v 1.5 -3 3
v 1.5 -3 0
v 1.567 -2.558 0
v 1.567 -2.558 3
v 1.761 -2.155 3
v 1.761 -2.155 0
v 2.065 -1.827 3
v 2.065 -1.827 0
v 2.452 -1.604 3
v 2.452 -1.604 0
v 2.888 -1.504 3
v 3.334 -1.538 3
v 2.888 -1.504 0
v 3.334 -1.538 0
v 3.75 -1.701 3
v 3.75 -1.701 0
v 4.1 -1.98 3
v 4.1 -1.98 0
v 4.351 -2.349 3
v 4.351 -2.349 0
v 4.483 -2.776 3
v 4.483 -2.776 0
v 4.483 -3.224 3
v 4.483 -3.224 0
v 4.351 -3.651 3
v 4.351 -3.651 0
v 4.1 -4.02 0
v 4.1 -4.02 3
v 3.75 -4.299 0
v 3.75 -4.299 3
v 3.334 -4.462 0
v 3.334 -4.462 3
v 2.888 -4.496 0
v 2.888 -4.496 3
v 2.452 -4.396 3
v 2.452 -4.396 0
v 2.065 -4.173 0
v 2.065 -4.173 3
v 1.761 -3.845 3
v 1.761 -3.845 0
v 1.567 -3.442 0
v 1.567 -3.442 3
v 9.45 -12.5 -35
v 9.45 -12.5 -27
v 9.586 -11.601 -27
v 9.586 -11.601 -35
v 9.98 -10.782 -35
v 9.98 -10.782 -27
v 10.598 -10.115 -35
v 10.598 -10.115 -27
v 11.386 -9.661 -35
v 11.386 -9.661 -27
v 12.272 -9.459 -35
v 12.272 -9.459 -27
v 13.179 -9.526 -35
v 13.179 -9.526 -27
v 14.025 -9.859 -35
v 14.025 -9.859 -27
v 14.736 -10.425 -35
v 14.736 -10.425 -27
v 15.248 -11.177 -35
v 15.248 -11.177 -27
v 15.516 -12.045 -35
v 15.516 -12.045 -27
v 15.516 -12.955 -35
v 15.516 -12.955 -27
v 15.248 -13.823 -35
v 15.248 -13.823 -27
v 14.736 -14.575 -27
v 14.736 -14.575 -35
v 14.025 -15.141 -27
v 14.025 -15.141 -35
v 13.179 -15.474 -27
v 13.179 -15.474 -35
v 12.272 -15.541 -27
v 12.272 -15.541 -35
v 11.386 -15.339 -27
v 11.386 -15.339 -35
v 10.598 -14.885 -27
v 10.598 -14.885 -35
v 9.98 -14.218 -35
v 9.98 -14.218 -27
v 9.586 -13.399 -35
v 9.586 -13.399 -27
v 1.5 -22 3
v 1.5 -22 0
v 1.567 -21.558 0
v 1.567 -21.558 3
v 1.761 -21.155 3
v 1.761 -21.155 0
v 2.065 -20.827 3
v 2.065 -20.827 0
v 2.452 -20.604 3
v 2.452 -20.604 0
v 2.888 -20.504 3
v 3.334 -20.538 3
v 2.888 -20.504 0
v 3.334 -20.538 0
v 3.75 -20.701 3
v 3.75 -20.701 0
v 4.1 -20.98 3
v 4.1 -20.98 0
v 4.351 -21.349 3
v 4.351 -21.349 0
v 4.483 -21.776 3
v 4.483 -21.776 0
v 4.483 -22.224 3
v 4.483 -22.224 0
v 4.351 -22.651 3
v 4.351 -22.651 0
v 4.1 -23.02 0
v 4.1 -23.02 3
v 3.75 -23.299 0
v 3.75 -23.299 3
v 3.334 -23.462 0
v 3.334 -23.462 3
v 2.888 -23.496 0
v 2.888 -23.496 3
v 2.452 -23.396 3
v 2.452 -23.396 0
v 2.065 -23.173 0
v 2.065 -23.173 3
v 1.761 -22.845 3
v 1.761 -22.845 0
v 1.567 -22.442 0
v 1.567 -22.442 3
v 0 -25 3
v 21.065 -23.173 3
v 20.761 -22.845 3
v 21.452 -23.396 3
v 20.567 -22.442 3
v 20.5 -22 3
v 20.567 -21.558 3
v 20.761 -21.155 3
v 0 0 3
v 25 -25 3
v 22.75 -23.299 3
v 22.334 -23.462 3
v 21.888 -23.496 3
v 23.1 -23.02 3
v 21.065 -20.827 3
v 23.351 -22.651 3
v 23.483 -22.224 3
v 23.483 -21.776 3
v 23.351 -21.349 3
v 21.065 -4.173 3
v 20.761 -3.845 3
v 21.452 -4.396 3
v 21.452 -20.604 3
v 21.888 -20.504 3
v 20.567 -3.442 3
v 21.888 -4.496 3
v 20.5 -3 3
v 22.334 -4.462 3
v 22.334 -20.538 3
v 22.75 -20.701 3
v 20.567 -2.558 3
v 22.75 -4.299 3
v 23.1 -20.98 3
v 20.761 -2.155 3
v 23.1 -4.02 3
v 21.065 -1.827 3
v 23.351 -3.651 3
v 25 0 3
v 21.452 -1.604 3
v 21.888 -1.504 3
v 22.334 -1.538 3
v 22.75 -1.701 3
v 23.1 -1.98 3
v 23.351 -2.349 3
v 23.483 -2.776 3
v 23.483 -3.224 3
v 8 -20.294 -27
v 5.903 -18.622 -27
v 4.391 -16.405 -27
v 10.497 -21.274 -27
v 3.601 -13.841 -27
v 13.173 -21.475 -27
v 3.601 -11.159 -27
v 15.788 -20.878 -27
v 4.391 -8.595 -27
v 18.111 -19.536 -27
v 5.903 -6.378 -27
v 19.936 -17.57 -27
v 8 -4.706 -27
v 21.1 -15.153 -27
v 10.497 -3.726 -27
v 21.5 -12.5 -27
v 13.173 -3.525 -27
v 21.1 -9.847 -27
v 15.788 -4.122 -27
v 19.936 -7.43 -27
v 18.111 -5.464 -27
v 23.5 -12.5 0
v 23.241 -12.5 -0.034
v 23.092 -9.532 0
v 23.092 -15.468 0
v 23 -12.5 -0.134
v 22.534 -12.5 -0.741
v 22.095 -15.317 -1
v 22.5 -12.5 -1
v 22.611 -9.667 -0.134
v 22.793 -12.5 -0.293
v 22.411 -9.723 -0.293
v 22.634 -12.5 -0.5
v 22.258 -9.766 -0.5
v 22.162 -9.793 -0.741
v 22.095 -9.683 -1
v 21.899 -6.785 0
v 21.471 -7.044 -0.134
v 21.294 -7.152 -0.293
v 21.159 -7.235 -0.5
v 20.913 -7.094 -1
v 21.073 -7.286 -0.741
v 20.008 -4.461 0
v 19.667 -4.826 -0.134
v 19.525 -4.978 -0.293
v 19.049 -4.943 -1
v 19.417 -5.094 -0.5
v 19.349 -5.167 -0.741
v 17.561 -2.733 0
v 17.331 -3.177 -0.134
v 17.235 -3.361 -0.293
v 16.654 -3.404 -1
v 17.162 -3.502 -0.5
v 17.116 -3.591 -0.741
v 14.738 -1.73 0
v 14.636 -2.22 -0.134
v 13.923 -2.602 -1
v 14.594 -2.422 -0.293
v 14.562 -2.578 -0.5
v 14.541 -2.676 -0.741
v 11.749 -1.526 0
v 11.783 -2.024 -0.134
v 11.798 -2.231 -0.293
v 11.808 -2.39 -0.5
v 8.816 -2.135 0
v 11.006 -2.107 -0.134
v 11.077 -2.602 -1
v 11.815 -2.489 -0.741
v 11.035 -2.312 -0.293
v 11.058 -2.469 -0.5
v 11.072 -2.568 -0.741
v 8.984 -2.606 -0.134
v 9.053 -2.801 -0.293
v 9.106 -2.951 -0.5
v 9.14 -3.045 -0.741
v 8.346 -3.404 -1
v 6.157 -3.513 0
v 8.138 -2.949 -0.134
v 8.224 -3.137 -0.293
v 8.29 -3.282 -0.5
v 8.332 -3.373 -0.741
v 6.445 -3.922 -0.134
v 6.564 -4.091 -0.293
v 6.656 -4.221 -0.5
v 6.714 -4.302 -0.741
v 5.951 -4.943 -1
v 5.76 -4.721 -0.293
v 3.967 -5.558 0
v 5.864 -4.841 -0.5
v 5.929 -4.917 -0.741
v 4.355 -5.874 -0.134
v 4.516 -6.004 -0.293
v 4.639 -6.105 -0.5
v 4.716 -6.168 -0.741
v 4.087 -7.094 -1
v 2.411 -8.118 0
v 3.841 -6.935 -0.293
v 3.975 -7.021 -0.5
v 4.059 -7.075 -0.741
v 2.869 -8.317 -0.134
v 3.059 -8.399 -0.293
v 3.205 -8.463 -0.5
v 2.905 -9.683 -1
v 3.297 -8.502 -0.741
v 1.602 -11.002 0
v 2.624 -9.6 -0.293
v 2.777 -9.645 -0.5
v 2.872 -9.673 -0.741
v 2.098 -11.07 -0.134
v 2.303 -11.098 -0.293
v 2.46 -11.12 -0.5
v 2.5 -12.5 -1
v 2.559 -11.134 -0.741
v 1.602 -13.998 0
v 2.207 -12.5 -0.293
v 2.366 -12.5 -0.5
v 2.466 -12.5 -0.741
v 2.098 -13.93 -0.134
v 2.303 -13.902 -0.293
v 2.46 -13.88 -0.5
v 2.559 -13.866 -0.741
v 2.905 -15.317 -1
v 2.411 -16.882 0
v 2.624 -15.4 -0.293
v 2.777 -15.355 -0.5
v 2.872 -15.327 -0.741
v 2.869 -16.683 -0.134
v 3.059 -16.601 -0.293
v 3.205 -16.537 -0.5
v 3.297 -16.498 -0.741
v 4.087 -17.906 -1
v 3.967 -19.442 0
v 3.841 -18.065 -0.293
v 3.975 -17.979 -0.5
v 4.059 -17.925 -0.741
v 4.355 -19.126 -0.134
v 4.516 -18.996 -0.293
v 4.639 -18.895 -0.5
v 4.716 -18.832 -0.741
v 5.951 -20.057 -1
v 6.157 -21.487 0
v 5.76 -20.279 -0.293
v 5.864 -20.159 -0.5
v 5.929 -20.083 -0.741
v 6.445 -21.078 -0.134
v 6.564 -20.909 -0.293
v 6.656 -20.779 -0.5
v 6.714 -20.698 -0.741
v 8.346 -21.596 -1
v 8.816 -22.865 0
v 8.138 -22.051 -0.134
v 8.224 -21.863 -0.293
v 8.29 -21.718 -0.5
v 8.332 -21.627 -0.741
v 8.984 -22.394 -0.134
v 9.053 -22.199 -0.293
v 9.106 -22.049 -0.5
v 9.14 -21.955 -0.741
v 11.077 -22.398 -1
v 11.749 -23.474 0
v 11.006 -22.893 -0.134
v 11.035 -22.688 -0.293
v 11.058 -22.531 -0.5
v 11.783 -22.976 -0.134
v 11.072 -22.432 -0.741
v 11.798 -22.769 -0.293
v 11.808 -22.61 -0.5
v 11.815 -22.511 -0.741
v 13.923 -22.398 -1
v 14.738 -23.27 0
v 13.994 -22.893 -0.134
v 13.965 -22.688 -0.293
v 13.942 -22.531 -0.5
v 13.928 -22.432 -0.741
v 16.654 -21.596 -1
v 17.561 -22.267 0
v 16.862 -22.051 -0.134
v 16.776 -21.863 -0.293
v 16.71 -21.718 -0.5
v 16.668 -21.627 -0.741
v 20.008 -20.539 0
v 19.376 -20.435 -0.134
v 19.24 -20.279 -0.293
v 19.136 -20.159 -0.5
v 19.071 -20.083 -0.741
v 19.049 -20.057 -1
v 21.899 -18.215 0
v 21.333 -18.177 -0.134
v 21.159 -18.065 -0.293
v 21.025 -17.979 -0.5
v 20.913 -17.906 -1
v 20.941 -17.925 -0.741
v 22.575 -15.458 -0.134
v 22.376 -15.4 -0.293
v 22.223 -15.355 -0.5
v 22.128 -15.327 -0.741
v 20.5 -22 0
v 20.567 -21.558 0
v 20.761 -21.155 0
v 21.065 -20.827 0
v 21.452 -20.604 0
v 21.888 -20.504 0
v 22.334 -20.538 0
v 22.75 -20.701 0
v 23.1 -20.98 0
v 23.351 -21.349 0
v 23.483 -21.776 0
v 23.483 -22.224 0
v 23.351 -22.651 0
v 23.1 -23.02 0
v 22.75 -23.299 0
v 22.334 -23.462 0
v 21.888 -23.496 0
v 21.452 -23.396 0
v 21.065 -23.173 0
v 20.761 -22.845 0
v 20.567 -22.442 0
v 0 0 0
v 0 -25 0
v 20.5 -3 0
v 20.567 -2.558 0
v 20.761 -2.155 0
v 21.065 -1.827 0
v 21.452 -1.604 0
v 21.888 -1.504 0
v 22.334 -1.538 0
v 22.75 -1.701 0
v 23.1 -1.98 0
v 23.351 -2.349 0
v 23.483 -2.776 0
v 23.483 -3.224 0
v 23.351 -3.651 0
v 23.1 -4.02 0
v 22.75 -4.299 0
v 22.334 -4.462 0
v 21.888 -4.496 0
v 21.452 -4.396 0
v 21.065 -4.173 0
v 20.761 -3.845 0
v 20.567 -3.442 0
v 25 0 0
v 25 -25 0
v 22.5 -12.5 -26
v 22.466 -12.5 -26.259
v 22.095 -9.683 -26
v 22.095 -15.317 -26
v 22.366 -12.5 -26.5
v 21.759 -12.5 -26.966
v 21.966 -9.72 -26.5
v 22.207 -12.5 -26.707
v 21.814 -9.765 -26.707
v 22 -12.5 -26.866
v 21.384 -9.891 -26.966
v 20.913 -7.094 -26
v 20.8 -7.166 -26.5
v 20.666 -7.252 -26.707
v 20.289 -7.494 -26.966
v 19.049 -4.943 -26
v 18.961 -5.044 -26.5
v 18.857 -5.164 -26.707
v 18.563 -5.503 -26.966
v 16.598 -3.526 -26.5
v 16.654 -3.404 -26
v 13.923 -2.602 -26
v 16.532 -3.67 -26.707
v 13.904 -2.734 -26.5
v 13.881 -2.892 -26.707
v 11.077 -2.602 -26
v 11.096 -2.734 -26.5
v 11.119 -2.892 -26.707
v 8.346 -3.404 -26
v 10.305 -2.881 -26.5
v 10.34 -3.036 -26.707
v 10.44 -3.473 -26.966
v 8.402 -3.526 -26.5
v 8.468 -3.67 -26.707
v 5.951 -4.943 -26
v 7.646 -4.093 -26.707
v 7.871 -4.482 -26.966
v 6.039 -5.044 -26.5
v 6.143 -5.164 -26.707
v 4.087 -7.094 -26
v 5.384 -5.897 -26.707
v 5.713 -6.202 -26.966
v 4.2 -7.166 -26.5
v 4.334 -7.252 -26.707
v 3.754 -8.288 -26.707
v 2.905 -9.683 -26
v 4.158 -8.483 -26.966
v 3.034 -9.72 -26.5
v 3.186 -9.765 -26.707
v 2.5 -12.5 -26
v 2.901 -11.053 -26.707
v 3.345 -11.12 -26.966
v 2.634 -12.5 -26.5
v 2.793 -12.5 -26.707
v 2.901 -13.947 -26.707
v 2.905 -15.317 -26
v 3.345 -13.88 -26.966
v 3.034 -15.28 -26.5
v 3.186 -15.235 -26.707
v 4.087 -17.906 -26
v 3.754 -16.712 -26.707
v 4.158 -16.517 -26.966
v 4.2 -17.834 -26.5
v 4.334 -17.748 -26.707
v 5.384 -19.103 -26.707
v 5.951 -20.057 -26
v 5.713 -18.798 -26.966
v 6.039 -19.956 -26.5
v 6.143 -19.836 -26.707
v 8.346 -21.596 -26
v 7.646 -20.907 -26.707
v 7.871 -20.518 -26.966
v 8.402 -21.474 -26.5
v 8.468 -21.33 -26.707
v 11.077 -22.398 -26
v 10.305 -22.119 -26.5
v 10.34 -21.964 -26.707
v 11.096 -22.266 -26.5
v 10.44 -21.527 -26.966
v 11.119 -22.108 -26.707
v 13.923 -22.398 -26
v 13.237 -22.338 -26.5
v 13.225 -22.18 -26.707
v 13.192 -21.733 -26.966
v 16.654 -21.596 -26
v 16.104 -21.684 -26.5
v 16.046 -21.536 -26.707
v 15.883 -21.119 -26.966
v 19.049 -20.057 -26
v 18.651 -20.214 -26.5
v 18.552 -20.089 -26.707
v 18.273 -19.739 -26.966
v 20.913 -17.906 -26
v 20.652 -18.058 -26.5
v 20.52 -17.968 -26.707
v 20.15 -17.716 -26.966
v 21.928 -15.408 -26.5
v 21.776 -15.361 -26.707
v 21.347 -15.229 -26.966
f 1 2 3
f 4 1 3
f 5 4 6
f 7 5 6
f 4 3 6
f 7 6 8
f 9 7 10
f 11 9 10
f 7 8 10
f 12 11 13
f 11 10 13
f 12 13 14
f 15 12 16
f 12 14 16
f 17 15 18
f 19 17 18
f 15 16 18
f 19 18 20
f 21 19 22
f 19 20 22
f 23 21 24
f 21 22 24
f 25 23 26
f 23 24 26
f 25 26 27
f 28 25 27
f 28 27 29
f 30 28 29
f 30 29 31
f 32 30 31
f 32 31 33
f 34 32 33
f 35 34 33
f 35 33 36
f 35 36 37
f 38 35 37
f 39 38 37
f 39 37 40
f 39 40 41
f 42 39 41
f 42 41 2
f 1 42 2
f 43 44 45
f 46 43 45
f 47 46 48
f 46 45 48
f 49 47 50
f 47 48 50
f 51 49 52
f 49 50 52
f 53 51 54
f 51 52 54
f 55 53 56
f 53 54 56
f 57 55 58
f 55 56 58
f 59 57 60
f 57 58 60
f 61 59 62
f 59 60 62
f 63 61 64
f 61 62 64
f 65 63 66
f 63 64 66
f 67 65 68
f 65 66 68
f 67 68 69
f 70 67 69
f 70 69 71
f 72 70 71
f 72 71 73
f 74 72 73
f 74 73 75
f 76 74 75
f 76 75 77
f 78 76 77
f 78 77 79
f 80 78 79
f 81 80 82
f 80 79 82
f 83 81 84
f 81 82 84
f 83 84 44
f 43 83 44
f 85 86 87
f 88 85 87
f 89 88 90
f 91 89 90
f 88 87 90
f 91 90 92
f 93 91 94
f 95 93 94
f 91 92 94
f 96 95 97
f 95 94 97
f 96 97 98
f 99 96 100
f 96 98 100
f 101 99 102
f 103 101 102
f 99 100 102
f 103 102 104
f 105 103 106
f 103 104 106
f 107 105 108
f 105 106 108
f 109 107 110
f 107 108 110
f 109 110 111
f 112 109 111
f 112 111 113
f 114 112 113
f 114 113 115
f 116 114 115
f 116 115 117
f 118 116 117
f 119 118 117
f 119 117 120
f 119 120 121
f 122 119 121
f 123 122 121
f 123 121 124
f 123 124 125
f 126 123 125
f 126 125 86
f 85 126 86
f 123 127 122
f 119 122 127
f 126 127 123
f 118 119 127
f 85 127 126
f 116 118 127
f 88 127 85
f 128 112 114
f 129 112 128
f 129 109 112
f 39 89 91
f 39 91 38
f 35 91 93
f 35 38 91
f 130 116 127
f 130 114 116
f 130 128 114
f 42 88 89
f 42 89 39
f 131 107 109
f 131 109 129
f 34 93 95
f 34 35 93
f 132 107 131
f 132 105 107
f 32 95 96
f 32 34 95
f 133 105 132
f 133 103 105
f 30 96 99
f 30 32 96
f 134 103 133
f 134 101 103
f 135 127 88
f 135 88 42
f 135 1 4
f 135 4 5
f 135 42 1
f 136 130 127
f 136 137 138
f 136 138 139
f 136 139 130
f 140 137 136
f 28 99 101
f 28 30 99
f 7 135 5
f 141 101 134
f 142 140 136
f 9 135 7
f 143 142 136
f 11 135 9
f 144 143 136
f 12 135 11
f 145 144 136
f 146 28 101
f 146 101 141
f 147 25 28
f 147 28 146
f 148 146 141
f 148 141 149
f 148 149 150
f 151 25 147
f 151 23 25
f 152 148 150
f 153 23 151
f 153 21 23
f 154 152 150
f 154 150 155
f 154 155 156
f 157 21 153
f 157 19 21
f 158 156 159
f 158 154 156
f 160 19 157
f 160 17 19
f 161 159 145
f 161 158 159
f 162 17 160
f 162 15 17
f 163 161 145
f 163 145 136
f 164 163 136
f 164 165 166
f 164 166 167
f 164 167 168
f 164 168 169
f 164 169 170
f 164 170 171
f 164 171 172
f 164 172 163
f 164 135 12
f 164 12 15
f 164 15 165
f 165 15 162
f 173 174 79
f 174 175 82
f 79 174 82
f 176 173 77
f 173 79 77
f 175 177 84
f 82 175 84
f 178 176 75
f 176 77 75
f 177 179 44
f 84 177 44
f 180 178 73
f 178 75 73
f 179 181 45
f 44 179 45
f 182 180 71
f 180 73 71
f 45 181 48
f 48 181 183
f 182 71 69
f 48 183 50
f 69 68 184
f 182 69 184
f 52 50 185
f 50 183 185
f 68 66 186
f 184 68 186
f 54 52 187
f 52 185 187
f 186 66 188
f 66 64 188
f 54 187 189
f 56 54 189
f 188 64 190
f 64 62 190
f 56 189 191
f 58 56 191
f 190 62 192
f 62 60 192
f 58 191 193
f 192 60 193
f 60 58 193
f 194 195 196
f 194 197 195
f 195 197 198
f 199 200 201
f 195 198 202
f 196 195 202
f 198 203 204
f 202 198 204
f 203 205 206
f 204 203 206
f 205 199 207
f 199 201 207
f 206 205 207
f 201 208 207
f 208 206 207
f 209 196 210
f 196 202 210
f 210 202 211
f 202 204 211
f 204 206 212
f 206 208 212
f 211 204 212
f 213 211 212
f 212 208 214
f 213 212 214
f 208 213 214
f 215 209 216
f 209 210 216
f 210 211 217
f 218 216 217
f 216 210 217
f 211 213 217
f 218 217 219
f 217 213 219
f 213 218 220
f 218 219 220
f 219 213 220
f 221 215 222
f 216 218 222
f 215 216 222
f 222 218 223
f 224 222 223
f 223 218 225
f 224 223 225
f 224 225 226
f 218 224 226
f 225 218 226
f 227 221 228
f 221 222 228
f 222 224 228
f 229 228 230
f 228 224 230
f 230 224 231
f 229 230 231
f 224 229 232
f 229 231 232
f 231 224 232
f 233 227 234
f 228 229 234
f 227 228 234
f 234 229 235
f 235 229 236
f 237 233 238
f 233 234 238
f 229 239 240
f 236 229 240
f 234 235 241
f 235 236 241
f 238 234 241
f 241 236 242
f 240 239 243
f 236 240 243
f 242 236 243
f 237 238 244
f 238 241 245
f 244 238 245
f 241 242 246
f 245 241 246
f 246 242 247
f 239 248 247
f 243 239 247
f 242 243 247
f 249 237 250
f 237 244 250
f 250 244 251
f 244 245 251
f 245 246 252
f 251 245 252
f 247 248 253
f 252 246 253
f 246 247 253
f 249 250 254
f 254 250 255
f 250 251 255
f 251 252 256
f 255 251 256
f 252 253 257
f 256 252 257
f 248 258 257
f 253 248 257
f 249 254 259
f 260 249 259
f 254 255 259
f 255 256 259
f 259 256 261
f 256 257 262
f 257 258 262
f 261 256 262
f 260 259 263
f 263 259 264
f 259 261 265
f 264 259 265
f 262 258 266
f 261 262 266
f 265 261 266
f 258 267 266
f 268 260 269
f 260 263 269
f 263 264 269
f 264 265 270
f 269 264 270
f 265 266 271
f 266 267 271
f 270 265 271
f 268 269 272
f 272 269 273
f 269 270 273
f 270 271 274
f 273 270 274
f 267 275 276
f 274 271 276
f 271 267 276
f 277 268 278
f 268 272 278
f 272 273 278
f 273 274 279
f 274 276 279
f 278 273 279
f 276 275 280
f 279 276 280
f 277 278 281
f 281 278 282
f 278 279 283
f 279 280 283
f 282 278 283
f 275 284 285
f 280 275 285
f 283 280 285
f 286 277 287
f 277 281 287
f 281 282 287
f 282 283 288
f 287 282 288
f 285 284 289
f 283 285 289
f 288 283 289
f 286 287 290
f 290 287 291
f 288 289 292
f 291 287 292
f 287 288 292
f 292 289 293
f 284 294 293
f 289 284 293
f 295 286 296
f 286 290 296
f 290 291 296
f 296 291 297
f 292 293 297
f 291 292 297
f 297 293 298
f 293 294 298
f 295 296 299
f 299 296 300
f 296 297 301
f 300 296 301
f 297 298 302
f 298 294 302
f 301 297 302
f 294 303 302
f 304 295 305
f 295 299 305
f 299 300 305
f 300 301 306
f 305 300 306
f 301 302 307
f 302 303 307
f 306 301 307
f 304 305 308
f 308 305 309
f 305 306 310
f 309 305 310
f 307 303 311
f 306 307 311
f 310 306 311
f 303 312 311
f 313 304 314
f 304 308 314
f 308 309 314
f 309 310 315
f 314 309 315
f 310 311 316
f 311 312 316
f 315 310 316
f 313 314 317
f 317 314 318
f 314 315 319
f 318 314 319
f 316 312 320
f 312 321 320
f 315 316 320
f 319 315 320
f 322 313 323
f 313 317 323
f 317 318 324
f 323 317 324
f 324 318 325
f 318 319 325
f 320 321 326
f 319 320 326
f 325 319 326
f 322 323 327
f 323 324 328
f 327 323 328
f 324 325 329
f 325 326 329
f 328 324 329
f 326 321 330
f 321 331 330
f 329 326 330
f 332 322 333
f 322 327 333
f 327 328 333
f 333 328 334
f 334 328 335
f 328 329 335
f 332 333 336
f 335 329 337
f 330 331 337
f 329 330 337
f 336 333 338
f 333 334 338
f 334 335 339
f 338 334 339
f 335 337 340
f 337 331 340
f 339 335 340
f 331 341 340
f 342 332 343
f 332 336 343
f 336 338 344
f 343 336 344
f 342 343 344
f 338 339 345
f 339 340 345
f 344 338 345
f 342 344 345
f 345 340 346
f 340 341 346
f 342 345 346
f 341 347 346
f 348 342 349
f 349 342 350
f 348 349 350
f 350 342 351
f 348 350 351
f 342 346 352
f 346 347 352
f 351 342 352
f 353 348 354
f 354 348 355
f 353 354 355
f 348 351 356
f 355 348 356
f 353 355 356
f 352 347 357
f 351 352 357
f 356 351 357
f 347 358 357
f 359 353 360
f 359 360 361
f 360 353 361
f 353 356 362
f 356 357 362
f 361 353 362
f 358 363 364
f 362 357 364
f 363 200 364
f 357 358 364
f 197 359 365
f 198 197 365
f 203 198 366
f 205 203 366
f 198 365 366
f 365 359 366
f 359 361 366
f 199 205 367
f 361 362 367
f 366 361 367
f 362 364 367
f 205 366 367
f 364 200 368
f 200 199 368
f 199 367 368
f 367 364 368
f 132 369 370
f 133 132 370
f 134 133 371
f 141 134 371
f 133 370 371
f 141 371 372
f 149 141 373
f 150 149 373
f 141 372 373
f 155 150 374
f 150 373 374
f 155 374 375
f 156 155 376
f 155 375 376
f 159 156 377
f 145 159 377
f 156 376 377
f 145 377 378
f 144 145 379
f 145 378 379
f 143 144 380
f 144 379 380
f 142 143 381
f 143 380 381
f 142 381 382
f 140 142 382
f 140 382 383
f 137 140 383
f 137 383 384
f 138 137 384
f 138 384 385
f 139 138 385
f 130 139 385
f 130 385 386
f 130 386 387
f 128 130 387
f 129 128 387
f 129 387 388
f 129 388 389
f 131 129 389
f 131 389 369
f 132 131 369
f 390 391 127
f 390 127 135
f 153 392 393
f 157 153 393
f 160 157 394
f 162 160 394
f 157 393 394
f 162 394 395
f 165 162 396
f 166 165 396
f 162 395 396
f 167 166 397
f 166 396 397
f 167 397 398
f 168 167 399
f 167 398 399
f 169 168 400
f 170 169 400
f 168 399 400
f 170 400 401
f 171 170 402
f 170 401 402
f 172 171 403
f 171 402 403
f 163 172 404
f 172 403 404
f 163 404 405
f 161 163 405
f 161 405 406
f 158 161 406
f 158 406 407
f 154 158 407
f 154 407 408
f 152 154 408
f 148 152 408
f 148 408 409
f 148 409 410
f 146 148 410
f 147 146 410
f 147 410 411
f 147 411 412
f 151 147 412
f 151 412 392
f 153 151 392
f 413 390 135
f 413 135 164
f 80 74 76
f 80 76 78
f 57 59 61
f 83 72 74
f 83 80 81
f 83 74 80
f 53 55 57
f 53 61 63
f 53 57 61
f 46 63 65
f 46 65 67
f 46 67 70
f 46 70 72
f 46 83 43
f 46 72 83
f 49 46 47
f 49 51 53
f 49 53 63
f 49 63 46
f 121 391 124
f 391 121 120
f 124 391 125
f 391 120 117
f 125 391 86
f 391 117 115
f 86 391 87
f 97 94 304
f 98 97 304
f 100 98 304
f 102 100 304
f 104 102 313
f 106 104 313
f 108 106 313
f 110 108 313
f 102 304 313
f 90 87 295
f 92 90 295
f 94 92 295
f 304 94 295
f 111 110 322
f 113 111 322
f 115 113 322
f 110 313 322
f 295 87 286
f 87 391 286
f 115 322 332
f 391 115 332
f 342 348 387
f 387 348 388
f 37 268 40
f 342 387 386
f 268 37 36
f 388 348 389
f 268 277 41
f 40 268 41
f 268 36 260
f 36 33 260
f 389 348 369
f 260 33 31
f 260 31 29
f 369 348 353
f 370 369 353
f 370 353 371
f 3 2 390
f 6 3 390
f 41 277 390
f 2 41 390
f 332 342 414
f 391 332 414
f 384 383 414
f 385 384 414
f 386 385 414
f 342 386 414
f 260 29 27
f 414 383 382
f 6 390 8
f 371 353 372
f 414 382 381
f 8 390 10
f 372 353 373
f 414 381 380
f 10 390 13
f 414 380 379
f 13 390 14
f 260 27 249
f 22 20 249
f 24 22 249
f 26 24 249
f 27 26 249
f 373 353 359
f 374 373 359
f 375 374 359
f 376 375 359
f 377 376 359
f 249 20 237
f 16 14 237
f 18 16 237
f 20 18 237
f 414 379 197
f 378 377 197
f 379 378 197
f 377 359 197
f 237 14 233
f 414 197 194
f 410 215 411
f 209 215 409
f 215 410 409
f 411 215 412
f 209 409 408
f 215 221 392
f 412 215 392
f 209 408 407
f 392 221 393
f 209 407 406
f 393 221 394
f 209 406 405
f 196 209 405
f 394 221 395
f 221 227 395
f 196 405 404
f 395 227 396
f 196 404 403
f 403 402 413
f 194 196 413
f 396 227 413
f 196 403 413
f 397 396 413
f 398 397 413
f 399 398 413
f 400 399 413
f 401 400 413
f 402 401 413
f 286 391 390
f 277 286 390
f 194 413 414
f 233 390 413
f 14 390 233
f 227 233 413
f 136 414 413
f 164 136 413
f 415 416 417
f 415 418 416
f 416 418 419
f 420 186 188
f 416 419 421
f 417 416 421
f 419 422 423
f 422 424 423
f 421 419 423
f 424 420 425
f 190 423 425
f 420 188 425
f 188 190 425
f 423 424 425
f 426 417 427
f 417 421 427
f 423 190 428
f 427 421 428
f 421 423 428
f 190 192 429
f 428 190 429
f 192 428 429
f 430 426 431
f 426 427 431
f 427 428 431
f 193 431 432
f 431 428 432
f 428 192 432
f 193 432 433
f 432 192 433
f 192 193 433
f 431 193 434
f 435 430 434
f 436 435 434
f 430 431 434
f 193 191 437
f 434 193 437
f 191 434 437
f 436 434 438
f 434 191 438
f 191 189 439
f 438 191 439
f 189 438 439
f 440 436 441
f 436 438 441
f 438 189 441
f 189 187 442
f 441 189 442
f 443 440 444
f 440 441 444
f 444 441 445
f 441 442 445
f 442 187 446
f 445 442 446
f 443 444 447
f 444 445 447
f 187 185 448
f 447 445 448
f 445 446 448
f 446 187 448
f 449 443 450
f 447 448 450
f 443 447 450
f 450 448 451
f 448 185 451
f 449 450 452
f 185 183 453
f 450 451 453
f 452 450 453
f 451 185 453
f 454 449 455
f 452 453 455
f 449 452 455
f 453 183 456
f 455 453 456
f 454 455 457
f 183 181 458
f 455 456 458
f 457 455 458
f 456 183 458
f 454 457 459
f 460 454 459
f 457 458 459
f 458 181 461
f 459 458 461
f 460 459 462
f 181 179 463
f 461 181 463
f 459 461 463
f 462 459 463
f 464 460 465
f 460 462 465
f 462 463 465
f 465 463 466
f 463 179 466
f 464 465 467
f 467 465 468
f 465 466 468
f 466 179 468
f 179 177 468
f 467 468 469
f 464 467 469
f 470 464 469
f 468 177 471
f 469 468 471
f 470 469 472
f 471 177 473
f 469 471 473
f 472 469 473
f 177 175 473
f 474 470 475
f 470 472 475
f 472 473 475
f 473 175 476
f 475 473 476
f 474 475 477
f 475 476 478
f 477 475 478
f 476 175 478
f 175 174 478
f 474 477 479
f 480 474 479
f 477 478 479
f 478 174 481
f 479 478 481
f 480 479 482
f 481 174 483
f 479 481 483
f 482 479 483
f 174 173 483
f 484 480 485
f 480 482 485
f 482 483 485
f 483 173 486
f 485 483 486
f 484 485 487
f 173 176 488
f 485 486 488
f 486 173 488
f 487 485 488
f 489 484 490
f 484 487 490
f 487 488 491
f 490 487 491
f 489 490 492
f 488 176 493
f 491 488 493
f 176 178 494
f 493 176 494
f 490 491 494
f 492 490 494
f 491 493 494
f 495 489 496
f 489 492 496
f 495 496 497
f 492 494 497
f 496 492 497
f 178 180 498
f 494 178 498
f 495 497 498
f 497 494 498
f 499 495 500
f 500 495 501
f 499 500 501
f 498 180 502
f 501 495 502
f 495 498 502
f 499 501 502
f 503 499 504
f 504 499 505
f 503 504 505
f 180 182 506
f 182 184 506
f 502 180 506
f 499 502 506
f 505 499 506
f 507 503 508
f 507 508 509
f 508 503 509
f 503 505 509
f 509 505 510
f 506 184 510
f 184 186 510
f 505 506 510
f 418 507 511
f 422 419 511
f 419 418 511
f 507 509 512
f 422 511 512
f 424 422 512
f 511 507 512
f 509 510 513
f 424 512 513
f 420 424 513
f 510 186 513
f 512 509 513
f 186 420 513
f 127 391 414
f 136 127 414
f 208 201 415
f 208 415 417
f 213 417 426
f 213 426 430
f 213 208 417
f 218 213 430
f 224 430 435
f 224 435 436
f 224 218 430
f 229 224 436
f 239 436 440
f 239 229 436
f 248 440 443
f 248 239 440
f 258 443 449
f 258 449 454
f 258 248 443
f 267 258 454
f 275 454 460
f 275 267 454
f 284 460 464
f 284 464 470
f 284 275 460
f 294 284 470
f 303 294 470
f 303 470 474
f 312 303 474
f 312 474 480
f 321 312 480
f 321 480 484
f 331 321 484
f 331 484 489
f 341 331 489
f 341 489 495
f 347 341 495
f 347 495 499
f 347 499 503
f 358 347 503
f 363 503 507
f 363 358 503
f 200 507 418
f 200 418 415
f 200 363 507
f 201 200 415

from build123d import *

# Parameters (mm, degrees)
SKETCH_2_W          = 25
SKETCH_2_H          = 25
EXTRUDE_1_DEPTH     = 3
SKETCH_3_R          = 1.5
CUT_EXTRUDE_2_DEPTH = 4
EXTRUDE_START       = -3
SKETCH_4_R          = 10
EXTRUDE_2_DEPTH     = 27
SKETCH_5_R          = 3.05
EXTRUDE_3_DEPTH     = 8
FILLET_3_R          = 1


with BuildPart() as part:
    # 草图2 → 凸台-拉伸1 (new body)
    with BuildSketch(Plane.XY):
        with Locations((12.5, -12.5)):
            Rectangle(SKETCH_2_W, SKETCH_2_H)
    extrude(amount=EXTRUDE_1_DEPTH)

    # 草图3 → 切除-拉伸2 (cut, through all)
    with BuildSketch(Plane(origin=(0, 0, 0), x_dir=(-1, 0, 0), z_dir=(0, 0, -1))):
        with Locations((-22, -3)):
            Circle(SKETCH_3_R)
        with Locations((-3, -3)):
            Circle(SKETCH_3_R)
        with Locations((-3, -22)):
            Circle(SKETCH_3_R)
        with Locations((-22, -22)):
            Circle(SKETCH_3_R)
    extrude(amount=-CUT_EXTRUDE_2_DEPTH, mode=Mode.SUBTRACT)

    # 草图4 → 凸台-拉伸2 (add)
    with BuildSketch(Plane.XY.offset(3).offset(EXTRUDE_START)):
        with Locations((12.5, -12.5)):
            Circle(SKETCH_4_R)
    extrude(amount=-EXTRUDE_2_DEPTH)

    # 草图5 → 凸台-拉伸3 (add)
    with BuildSketch(Plane(origin=(0, 0, -27), x_dir=(-1, 0, 0), z_dir=(0, 0, -1))):
        with Locations((-12.5, -12.5)):
            Circle(SKETCH_5_R)
    extrude(amount=EXTRUDE_3_DEPTH)

    # 圆角3
    fillet_3_edges = [part.edges().sort_by_distance(p)[0] for p in [
        (2.5, -12.5, -27),
        (2.5, -12.5, 0),
    ]]
    fillet(fillet_3_edges, radius=FILLET_3_R)


solid = part.part
